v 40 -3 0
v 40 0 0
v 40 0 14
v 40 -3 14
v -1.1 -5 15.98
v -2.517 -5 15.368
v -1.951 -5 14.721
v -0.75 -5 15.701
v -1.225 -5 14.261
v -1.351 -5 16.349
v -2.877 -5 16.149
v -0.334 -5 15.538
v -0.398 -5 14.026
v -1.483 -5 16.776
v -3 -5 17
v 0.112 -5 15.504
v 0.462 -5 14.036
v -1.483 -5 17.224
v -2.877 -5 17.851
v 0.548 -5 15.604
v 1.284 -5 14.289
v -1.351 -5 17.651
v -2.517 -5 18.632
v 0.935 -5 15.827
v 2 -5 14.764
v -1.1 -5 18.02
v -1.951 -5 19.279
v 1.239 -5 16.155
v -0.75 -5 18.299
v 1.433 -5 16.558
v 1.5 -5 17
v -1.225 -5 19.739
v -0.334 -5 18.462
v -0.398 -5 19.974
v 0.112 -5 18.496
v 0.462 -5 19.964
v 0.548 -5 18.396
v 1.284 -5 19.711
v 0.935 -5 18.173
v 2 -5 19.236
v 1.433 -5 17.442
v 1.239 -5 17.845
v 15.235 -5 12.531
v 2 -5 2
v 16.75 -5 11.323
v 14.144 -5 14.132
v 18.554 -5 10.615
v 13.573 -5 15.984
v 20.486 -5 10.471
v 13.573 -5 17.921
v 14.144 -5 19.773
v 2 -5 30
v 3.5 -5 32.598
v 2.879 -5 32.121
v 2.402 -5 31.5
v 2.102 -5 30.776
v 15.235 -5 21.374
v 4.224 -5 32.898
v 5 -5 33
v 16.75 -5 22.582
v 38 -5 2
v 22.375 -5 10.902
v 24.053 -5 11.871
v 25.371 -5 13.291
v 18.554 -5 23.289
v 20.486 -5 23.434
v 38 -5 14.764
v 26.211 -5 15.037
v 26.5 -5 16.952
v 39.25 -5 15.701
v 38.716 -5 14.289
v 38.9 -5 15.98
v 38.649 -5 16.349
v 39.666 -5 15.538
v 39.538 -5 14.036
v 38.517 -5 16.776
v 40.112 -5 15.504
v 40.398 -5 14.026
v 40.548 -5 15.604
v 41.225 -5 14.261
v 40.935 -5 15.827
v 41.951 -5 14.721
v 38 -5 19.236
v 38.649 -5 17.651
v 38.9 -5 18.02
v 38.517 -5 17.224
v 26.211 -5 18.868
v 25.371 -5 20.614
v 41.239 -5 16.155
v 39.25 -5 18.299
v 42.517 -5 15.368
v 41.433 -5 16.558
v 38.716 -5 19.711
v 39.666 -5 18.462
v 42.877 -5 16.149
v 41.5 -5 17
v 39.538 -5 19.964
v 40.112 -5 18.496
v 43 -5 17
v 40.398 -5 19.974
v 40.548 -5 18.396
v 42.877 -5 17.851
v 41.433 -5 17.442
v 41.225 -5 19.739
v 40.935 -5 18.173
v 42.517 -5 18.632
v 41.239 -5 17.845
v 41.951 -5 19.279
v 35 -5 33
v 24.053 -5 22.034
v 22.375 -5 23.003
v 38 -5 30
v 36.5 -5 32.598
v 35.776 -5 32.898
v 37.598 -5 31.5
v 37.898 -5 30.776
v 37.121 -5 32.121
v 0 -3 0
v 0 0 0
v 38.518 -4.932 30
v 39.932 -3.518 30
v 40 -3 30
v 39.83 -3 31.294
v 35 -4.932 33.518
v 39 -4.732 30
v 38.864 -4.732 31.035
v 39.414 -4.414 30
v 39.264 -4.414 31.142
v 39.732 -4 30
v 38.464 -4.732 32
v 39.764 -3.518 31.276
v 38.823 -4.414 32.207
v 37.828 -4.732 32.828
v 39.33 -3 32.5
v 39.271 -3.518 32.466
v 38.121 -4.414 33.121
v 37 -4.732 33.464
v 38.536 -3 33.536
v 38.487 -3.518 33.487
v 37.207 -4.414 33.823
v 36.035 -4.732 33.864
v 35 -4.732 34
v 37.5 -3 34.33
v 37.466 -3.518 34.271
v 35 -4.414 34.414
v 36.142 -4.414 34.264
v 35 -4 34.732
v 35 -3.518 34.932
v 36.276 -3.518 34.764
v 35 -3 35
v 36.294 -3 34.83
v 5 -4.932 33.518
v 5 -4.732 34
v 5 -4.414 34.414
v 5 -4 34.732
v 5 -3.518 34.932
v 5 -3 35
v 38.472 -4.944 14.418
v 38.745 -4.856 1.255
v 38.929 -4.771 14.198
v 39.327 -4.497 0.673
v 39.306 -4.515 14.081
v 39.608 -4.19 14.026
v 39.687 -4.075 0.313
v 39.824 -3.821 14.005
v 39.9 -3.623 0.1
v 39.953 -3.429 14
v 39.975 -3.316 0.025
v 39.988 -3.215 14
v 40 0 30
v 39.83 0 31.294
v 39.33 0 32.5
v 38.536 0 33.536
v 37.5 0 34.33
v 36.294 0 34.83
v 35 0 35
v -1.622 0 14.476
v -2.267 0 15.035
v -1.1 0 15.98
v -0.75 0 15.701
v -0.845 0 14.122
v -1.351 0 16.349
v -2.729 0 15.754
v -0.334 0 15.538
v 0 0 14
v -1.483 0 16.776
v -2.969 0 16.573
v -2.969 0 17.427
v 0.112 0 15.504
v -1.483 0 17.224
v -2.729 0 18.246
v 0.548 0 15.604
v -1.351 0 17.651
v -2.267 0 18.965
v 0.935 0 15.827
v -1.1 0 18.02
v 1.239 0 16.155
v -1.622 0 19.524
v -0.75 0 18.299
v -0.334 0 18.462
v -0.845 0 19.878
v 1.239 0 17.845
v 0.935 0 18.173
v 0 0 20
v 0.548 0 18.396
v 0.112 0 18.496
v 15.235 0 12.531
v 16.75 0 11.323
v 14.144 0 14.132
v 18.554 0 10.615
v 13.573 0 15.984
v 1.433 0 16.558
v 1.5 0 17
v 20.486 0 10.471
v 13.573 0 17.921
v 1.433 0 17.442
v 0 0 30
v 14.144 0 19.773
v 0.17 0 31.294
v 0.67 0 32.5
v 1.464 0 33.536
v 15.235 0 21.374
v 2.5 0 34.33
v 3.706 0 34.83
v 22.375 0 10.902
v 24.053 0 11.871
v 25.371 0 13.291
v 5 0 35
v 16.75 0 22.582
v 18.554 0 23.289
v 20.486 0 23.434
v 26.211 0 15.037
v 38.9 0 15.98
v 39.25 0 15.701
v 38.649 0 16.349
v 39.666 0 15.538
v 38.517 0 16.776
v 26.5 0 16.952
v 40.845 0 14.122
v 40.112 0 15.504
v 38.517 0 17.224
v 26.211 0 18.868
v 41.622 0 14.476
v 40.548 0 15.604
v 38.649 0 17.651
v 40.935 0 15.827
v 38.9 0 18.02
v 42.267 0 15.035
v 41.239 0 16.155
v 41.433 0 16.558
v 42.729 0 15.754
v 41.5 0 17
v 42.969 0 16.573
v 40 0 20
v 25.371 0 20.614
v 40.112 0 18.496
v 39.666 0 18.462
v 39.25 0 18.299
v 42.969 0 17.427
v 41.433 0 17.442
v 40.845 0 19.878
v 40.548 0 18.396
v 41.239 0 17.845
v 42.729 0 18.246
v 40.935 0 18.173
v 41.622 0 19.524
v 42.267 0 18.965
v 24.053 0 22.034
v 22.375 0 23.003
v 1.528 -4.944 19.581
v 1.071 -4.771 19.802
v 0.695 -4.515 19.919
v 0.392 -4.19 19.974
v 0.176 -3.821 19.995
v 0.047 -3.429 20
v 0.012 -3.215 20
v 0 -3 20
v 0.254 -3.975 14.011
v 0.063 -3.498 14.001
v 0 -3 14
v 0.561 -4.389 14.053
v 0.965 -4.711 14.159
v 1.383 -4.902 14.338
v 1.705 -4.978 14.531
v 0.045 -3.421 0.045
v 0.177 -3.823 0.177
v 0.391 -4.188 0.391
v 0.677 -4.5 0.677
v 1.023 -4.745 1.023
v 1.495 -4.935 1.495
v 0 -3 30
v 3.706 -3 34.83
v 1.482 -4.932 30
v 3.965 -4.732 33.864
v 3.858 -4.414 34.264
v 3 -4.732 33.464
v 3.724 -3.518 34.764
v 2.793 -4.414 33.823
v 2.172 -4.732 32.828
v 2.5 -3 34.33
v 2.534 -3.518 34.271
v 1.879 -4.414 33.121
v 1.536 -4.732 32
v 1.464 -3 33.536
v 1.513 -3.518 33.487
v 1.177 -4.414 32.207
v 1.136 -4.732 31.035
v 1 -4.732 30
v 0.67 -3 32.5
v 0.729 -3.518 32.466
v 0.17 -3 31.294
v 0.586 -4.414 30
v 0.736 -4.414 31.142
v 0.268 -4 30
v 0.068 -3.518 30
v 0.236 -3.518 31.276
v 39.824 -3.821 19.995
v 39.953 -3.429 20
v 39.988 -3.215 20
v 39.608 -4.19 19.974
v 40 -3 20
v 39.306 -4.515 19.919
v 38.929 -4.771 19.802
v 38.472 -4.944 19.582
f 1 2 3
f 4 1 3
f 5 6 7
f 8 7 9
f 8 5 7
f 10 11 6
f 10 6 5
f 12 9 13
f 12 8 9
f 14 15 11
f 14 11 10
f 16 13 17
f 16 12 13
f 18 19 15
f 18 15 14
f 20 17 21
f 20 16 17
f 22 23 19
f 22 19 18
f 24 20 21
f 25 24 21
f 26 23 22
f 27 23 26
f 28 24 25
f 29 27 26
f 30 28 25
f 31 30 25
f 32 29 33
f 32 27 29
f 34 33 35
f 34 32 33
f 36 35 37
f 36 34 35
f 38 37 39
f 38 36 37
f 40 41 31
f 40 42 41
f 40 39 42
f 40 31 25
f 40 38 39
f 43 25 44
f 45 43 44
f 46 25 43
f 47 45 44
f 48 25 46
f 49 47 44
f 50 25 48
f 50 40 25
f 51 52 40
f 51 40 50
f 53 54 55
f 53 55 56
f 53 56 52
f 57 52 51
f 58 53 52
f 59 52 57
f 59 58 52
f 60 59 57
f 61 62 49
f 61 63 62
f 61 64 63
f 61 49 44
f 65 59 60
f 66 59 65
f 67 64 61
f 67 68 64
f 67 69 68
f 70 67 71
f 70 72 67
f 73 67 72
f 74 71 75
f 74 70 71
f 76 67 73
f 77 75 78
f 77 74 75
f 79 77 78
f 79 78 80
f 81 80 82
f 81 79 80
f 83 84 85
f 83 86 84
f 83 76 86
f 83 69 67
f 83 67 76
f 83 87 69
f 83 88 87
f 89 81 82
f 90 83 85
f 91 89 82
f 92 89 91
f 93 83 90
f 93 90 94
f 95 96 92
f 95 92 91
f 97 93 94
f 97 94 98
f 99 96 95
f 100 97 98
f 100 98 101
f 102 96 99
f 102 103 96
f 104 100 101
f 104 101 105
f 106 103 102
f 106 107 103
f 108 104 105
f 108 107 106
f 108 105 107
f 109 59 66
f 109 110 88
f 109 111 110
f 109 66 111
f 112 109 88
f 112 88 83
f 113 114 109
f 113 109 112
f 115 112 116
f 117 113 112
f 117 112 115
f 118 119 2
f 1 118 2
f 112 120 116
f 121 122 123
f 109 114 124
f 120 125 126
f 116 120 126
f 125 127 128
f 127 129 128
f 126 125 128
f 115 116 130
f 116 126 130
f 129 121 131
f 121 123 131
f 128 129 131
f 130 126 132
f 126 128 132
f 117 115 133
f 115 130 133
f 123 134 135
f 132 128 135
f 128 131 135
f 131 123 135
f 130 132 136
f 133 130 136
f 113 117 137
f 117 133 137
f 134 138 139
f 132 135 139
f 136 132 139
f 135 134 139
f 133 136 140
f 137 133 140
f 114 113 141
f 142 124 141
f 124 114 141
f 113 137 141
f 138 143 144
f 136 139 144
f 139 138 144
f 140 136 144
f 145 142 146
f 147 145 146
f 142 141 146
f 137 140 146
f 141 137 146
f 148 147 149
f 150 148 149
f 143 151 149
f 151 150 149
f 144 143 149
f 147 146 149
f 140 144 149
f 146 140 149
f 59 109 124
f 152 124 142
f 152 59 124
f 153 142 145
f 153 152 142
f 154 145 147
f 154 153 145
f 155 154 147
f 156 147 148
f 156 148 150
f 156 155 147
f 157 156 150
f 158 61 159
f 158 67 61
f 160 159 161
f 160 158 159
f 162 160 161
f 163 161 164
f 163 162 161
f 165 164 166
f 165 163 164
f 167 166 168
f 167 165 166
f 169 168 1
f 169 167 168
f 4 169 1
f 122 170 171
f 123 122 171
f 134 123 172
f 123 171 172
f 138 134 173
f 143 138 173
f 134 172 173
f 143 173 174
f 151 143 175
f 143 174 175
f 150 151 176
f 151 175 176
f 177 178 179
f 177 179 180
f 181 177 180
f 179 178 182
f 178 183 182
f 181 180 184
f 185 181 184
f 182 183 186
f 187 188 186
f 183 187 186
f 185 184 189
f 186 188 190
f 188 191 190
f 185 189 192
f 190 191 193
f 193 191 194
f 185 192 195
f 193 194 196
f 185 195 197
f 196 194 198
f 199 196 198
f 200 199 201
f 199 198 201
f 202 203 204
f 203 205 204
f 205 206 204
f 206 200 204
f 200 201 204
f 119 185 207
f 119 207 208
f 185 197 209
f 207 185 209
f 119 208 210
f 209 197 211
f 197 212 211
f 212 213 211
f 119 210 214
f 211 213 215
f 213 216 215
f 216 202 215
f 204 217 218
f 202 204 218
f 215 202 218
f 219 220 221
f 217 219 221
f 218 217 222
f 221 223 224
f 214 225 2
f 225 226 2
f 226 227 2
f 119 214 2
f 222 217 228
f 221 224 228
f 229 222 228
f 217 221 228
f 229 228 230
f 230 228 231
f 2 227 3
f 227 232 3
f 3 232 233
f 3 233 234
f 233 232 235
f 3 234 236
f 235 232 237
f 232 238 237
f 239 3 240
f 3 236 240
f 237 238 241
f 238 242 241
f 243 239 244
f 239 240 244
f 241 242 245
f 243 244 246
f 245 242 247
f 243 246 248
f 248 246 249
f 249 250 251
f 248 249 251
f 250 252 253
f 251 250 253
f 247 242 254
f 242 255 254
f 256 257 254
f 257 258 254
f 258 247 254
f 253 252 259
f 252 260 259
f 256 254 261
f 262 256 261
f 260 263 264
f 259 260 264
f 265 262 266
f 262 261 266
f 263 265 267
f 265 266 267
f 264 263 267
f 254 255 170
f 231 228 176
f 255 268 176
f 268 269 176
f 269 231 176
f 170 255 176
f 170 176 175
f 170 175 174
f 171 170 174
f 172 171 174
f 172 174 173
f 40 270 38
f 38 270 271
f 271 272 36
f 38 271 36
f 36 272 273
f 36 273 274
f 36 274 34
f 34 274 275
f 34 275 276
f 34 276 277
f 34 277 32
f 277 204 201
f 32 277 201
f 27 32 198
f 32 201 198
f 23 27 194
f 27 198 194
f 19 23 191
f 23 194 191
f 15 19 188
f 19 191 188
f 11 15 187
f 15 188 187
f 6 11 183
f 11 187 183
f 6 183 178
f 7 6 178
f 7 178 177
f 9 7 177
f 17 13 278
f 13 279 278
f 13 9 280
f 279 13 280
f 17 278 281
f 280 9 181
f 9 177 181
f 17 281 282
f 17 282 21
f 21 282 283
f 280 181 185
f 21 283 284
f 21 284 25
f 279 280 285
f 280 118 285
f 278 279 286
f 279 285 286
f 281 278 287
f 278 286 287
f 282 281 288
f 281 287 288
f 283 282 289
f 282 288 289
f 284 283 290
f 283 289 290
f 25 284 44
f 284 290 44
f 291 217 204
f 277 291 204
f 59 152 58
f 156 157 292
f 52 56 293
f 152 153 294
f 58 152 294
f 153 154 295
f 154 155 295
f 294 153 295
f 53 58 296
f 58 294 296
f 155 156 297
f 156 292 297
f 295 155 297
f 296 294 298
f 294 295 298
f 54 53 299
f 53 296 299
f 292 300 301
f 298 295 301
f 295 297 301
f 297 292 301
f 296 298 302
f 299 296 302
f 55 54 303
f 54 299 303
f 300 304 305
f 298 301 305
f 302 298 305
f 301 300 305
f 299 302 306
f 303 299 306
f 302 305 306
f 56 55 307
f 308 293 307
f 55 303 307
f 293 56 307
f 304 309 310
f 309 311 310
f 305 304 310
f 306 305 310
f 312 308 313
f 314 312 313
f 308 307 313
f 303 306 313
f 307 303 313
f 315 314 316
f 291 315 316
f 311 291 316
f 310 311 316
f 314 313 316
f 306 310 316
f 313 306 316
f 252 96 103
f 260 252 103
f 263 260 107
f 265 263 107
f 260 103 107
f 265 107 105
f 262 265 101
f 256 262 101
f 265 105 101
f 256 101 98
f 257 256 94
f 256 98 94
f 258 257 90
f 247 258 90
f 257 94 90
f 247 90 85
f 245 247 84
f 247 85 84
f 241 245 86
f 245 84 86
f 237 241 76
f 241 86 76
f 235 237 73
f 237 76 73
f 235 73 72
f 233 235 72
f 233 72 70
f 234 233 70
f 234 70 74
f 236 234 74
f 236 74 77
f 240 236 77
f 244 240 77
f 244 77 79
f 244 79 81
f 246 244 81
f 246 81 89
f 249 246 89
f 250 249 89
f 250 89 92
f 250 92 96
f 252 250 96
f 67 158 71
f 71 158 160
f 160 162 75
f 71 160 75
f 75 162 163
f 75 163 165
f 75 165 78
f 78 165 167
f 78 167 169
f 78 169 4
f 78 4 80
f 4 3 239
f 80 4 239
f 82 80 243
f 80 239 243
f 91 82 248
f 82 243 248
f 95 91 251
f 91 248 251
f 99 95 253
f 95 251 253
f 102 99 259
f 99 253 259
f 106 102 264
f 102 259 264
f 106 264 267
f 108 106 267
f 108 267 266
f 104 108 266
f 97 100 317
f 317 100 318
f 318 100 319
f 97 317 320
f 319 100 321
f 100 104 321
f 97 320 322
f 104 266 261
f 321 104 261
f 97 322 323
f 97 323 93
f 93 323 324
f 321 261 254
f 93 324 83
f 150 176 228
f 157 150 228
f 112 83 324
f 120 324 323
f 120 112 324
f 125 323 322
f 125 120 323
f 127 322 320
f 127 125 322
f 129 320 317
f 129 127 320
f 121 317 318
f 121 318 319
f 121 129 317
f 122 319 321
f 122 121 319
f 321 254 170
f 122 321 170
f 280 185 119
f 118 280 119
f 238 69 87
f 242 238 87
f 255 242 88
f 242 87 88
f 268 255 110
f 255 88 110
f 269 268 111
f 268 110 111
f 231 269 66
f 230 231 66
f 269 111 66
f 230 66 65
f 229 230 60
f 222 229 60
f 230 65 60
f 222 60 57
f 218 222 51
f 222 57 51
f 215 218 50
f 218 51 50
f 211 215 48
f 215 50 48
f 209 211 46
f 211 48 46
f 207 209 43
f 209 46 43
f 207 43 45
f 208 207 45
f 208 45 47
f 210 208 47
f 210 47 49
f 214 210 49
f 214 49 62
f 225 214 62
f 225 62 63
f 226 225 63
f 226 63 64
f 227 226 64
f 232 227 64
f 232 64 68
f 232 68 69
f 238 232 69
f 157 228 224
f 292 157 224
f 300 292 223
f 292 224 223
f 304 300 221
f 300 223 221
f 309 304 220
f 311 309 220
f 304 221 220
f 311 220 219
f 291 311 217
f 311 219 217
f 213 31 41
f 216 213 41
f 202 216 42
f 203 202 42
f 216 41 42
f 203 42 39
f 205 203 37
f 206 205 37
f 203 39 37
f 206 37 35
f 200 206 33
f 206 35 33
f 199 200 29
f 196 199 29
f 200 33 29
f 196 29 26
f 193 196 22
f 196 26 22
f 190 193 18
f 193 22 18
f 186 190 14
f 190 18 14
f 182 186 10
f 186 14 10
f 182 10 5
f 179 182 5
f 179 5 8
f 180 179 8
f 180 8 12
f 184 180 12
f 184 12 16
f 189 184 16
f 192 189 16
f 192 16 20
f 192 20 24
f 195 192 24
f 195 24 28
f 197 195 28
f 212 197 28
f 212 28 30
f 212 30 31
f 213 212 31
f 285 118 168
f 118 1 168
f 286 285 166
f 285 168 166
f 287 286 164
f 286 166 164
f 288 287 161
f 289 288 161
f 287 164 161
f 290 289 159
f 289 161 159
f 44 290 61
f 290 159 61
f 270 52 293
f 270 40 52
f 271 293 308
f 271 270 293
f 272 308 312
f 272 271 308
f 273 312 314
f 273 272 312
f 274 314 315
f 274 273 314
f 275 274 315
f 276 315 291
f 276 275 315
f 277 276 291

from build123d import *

# Parameters (mm, degrees)
F1_DEPTH = 5
F2_R     = 1.5
F3_DEPTH = 25
F4_R     = 6.5
F5_DEPTH = 25
F6_R     = 2


with BuildPart() as f1:
    # F0 (on Front) → F1 (new body)
    with BuildSketch(Plane.XZ):
        with BuildLine():
            Line((0, 14), (0, 0))
            Line((0, 0), (40, 0))
            Line((40, 0), (40, 14))
            ThreePointArc((40, 14), (43, 17), (40, 20))
            Line((40, 20), (40, 30))
            ThreePointArc((40, 30), (38.535534, 33.535534), (35, 35))
            Line((35, 35), (5, 35))
            ThreePointArc((5, 35), (1.464466, 33.535534), (0, 30))
            Line((0, 30), (0, 20))
            ThreePointArc((0, 20), (-3, 17), (0, 14))
        make_face()
    extrude(amount=F1_DEPTH)

    # F2 (on face) → F3 (cut)
    with BuildSketch(Plane.XZ.offset(5)):
        with Locations((0, 17)):
            Circle(F2_R)
        with Locations((40, 17)):
            Circle(F2_R)
    extrude(amount=-F3_DEPTH, mode=Mode.SUBTRACT)

    # F4 (on face) → F5 (cut)
    with BuildSketch(Plane.XZ.offset(5)):
        with Locations((20, 16.952448)):
            Circle(F4_R)
    extrude(amount=-F5_DEPTH, mode=Mode.SUBTRACT)

    # F6
    f6_edges = [f1.edges().sort_by_distance(p)[0] for p in [
        (0, -5, 25),
        (40, -5, 7),
        (20, -5, 0),
        (0, -5, 7),
    ]]
    fillet(f6_edges, radius=F6_R)


solid = f1.part
